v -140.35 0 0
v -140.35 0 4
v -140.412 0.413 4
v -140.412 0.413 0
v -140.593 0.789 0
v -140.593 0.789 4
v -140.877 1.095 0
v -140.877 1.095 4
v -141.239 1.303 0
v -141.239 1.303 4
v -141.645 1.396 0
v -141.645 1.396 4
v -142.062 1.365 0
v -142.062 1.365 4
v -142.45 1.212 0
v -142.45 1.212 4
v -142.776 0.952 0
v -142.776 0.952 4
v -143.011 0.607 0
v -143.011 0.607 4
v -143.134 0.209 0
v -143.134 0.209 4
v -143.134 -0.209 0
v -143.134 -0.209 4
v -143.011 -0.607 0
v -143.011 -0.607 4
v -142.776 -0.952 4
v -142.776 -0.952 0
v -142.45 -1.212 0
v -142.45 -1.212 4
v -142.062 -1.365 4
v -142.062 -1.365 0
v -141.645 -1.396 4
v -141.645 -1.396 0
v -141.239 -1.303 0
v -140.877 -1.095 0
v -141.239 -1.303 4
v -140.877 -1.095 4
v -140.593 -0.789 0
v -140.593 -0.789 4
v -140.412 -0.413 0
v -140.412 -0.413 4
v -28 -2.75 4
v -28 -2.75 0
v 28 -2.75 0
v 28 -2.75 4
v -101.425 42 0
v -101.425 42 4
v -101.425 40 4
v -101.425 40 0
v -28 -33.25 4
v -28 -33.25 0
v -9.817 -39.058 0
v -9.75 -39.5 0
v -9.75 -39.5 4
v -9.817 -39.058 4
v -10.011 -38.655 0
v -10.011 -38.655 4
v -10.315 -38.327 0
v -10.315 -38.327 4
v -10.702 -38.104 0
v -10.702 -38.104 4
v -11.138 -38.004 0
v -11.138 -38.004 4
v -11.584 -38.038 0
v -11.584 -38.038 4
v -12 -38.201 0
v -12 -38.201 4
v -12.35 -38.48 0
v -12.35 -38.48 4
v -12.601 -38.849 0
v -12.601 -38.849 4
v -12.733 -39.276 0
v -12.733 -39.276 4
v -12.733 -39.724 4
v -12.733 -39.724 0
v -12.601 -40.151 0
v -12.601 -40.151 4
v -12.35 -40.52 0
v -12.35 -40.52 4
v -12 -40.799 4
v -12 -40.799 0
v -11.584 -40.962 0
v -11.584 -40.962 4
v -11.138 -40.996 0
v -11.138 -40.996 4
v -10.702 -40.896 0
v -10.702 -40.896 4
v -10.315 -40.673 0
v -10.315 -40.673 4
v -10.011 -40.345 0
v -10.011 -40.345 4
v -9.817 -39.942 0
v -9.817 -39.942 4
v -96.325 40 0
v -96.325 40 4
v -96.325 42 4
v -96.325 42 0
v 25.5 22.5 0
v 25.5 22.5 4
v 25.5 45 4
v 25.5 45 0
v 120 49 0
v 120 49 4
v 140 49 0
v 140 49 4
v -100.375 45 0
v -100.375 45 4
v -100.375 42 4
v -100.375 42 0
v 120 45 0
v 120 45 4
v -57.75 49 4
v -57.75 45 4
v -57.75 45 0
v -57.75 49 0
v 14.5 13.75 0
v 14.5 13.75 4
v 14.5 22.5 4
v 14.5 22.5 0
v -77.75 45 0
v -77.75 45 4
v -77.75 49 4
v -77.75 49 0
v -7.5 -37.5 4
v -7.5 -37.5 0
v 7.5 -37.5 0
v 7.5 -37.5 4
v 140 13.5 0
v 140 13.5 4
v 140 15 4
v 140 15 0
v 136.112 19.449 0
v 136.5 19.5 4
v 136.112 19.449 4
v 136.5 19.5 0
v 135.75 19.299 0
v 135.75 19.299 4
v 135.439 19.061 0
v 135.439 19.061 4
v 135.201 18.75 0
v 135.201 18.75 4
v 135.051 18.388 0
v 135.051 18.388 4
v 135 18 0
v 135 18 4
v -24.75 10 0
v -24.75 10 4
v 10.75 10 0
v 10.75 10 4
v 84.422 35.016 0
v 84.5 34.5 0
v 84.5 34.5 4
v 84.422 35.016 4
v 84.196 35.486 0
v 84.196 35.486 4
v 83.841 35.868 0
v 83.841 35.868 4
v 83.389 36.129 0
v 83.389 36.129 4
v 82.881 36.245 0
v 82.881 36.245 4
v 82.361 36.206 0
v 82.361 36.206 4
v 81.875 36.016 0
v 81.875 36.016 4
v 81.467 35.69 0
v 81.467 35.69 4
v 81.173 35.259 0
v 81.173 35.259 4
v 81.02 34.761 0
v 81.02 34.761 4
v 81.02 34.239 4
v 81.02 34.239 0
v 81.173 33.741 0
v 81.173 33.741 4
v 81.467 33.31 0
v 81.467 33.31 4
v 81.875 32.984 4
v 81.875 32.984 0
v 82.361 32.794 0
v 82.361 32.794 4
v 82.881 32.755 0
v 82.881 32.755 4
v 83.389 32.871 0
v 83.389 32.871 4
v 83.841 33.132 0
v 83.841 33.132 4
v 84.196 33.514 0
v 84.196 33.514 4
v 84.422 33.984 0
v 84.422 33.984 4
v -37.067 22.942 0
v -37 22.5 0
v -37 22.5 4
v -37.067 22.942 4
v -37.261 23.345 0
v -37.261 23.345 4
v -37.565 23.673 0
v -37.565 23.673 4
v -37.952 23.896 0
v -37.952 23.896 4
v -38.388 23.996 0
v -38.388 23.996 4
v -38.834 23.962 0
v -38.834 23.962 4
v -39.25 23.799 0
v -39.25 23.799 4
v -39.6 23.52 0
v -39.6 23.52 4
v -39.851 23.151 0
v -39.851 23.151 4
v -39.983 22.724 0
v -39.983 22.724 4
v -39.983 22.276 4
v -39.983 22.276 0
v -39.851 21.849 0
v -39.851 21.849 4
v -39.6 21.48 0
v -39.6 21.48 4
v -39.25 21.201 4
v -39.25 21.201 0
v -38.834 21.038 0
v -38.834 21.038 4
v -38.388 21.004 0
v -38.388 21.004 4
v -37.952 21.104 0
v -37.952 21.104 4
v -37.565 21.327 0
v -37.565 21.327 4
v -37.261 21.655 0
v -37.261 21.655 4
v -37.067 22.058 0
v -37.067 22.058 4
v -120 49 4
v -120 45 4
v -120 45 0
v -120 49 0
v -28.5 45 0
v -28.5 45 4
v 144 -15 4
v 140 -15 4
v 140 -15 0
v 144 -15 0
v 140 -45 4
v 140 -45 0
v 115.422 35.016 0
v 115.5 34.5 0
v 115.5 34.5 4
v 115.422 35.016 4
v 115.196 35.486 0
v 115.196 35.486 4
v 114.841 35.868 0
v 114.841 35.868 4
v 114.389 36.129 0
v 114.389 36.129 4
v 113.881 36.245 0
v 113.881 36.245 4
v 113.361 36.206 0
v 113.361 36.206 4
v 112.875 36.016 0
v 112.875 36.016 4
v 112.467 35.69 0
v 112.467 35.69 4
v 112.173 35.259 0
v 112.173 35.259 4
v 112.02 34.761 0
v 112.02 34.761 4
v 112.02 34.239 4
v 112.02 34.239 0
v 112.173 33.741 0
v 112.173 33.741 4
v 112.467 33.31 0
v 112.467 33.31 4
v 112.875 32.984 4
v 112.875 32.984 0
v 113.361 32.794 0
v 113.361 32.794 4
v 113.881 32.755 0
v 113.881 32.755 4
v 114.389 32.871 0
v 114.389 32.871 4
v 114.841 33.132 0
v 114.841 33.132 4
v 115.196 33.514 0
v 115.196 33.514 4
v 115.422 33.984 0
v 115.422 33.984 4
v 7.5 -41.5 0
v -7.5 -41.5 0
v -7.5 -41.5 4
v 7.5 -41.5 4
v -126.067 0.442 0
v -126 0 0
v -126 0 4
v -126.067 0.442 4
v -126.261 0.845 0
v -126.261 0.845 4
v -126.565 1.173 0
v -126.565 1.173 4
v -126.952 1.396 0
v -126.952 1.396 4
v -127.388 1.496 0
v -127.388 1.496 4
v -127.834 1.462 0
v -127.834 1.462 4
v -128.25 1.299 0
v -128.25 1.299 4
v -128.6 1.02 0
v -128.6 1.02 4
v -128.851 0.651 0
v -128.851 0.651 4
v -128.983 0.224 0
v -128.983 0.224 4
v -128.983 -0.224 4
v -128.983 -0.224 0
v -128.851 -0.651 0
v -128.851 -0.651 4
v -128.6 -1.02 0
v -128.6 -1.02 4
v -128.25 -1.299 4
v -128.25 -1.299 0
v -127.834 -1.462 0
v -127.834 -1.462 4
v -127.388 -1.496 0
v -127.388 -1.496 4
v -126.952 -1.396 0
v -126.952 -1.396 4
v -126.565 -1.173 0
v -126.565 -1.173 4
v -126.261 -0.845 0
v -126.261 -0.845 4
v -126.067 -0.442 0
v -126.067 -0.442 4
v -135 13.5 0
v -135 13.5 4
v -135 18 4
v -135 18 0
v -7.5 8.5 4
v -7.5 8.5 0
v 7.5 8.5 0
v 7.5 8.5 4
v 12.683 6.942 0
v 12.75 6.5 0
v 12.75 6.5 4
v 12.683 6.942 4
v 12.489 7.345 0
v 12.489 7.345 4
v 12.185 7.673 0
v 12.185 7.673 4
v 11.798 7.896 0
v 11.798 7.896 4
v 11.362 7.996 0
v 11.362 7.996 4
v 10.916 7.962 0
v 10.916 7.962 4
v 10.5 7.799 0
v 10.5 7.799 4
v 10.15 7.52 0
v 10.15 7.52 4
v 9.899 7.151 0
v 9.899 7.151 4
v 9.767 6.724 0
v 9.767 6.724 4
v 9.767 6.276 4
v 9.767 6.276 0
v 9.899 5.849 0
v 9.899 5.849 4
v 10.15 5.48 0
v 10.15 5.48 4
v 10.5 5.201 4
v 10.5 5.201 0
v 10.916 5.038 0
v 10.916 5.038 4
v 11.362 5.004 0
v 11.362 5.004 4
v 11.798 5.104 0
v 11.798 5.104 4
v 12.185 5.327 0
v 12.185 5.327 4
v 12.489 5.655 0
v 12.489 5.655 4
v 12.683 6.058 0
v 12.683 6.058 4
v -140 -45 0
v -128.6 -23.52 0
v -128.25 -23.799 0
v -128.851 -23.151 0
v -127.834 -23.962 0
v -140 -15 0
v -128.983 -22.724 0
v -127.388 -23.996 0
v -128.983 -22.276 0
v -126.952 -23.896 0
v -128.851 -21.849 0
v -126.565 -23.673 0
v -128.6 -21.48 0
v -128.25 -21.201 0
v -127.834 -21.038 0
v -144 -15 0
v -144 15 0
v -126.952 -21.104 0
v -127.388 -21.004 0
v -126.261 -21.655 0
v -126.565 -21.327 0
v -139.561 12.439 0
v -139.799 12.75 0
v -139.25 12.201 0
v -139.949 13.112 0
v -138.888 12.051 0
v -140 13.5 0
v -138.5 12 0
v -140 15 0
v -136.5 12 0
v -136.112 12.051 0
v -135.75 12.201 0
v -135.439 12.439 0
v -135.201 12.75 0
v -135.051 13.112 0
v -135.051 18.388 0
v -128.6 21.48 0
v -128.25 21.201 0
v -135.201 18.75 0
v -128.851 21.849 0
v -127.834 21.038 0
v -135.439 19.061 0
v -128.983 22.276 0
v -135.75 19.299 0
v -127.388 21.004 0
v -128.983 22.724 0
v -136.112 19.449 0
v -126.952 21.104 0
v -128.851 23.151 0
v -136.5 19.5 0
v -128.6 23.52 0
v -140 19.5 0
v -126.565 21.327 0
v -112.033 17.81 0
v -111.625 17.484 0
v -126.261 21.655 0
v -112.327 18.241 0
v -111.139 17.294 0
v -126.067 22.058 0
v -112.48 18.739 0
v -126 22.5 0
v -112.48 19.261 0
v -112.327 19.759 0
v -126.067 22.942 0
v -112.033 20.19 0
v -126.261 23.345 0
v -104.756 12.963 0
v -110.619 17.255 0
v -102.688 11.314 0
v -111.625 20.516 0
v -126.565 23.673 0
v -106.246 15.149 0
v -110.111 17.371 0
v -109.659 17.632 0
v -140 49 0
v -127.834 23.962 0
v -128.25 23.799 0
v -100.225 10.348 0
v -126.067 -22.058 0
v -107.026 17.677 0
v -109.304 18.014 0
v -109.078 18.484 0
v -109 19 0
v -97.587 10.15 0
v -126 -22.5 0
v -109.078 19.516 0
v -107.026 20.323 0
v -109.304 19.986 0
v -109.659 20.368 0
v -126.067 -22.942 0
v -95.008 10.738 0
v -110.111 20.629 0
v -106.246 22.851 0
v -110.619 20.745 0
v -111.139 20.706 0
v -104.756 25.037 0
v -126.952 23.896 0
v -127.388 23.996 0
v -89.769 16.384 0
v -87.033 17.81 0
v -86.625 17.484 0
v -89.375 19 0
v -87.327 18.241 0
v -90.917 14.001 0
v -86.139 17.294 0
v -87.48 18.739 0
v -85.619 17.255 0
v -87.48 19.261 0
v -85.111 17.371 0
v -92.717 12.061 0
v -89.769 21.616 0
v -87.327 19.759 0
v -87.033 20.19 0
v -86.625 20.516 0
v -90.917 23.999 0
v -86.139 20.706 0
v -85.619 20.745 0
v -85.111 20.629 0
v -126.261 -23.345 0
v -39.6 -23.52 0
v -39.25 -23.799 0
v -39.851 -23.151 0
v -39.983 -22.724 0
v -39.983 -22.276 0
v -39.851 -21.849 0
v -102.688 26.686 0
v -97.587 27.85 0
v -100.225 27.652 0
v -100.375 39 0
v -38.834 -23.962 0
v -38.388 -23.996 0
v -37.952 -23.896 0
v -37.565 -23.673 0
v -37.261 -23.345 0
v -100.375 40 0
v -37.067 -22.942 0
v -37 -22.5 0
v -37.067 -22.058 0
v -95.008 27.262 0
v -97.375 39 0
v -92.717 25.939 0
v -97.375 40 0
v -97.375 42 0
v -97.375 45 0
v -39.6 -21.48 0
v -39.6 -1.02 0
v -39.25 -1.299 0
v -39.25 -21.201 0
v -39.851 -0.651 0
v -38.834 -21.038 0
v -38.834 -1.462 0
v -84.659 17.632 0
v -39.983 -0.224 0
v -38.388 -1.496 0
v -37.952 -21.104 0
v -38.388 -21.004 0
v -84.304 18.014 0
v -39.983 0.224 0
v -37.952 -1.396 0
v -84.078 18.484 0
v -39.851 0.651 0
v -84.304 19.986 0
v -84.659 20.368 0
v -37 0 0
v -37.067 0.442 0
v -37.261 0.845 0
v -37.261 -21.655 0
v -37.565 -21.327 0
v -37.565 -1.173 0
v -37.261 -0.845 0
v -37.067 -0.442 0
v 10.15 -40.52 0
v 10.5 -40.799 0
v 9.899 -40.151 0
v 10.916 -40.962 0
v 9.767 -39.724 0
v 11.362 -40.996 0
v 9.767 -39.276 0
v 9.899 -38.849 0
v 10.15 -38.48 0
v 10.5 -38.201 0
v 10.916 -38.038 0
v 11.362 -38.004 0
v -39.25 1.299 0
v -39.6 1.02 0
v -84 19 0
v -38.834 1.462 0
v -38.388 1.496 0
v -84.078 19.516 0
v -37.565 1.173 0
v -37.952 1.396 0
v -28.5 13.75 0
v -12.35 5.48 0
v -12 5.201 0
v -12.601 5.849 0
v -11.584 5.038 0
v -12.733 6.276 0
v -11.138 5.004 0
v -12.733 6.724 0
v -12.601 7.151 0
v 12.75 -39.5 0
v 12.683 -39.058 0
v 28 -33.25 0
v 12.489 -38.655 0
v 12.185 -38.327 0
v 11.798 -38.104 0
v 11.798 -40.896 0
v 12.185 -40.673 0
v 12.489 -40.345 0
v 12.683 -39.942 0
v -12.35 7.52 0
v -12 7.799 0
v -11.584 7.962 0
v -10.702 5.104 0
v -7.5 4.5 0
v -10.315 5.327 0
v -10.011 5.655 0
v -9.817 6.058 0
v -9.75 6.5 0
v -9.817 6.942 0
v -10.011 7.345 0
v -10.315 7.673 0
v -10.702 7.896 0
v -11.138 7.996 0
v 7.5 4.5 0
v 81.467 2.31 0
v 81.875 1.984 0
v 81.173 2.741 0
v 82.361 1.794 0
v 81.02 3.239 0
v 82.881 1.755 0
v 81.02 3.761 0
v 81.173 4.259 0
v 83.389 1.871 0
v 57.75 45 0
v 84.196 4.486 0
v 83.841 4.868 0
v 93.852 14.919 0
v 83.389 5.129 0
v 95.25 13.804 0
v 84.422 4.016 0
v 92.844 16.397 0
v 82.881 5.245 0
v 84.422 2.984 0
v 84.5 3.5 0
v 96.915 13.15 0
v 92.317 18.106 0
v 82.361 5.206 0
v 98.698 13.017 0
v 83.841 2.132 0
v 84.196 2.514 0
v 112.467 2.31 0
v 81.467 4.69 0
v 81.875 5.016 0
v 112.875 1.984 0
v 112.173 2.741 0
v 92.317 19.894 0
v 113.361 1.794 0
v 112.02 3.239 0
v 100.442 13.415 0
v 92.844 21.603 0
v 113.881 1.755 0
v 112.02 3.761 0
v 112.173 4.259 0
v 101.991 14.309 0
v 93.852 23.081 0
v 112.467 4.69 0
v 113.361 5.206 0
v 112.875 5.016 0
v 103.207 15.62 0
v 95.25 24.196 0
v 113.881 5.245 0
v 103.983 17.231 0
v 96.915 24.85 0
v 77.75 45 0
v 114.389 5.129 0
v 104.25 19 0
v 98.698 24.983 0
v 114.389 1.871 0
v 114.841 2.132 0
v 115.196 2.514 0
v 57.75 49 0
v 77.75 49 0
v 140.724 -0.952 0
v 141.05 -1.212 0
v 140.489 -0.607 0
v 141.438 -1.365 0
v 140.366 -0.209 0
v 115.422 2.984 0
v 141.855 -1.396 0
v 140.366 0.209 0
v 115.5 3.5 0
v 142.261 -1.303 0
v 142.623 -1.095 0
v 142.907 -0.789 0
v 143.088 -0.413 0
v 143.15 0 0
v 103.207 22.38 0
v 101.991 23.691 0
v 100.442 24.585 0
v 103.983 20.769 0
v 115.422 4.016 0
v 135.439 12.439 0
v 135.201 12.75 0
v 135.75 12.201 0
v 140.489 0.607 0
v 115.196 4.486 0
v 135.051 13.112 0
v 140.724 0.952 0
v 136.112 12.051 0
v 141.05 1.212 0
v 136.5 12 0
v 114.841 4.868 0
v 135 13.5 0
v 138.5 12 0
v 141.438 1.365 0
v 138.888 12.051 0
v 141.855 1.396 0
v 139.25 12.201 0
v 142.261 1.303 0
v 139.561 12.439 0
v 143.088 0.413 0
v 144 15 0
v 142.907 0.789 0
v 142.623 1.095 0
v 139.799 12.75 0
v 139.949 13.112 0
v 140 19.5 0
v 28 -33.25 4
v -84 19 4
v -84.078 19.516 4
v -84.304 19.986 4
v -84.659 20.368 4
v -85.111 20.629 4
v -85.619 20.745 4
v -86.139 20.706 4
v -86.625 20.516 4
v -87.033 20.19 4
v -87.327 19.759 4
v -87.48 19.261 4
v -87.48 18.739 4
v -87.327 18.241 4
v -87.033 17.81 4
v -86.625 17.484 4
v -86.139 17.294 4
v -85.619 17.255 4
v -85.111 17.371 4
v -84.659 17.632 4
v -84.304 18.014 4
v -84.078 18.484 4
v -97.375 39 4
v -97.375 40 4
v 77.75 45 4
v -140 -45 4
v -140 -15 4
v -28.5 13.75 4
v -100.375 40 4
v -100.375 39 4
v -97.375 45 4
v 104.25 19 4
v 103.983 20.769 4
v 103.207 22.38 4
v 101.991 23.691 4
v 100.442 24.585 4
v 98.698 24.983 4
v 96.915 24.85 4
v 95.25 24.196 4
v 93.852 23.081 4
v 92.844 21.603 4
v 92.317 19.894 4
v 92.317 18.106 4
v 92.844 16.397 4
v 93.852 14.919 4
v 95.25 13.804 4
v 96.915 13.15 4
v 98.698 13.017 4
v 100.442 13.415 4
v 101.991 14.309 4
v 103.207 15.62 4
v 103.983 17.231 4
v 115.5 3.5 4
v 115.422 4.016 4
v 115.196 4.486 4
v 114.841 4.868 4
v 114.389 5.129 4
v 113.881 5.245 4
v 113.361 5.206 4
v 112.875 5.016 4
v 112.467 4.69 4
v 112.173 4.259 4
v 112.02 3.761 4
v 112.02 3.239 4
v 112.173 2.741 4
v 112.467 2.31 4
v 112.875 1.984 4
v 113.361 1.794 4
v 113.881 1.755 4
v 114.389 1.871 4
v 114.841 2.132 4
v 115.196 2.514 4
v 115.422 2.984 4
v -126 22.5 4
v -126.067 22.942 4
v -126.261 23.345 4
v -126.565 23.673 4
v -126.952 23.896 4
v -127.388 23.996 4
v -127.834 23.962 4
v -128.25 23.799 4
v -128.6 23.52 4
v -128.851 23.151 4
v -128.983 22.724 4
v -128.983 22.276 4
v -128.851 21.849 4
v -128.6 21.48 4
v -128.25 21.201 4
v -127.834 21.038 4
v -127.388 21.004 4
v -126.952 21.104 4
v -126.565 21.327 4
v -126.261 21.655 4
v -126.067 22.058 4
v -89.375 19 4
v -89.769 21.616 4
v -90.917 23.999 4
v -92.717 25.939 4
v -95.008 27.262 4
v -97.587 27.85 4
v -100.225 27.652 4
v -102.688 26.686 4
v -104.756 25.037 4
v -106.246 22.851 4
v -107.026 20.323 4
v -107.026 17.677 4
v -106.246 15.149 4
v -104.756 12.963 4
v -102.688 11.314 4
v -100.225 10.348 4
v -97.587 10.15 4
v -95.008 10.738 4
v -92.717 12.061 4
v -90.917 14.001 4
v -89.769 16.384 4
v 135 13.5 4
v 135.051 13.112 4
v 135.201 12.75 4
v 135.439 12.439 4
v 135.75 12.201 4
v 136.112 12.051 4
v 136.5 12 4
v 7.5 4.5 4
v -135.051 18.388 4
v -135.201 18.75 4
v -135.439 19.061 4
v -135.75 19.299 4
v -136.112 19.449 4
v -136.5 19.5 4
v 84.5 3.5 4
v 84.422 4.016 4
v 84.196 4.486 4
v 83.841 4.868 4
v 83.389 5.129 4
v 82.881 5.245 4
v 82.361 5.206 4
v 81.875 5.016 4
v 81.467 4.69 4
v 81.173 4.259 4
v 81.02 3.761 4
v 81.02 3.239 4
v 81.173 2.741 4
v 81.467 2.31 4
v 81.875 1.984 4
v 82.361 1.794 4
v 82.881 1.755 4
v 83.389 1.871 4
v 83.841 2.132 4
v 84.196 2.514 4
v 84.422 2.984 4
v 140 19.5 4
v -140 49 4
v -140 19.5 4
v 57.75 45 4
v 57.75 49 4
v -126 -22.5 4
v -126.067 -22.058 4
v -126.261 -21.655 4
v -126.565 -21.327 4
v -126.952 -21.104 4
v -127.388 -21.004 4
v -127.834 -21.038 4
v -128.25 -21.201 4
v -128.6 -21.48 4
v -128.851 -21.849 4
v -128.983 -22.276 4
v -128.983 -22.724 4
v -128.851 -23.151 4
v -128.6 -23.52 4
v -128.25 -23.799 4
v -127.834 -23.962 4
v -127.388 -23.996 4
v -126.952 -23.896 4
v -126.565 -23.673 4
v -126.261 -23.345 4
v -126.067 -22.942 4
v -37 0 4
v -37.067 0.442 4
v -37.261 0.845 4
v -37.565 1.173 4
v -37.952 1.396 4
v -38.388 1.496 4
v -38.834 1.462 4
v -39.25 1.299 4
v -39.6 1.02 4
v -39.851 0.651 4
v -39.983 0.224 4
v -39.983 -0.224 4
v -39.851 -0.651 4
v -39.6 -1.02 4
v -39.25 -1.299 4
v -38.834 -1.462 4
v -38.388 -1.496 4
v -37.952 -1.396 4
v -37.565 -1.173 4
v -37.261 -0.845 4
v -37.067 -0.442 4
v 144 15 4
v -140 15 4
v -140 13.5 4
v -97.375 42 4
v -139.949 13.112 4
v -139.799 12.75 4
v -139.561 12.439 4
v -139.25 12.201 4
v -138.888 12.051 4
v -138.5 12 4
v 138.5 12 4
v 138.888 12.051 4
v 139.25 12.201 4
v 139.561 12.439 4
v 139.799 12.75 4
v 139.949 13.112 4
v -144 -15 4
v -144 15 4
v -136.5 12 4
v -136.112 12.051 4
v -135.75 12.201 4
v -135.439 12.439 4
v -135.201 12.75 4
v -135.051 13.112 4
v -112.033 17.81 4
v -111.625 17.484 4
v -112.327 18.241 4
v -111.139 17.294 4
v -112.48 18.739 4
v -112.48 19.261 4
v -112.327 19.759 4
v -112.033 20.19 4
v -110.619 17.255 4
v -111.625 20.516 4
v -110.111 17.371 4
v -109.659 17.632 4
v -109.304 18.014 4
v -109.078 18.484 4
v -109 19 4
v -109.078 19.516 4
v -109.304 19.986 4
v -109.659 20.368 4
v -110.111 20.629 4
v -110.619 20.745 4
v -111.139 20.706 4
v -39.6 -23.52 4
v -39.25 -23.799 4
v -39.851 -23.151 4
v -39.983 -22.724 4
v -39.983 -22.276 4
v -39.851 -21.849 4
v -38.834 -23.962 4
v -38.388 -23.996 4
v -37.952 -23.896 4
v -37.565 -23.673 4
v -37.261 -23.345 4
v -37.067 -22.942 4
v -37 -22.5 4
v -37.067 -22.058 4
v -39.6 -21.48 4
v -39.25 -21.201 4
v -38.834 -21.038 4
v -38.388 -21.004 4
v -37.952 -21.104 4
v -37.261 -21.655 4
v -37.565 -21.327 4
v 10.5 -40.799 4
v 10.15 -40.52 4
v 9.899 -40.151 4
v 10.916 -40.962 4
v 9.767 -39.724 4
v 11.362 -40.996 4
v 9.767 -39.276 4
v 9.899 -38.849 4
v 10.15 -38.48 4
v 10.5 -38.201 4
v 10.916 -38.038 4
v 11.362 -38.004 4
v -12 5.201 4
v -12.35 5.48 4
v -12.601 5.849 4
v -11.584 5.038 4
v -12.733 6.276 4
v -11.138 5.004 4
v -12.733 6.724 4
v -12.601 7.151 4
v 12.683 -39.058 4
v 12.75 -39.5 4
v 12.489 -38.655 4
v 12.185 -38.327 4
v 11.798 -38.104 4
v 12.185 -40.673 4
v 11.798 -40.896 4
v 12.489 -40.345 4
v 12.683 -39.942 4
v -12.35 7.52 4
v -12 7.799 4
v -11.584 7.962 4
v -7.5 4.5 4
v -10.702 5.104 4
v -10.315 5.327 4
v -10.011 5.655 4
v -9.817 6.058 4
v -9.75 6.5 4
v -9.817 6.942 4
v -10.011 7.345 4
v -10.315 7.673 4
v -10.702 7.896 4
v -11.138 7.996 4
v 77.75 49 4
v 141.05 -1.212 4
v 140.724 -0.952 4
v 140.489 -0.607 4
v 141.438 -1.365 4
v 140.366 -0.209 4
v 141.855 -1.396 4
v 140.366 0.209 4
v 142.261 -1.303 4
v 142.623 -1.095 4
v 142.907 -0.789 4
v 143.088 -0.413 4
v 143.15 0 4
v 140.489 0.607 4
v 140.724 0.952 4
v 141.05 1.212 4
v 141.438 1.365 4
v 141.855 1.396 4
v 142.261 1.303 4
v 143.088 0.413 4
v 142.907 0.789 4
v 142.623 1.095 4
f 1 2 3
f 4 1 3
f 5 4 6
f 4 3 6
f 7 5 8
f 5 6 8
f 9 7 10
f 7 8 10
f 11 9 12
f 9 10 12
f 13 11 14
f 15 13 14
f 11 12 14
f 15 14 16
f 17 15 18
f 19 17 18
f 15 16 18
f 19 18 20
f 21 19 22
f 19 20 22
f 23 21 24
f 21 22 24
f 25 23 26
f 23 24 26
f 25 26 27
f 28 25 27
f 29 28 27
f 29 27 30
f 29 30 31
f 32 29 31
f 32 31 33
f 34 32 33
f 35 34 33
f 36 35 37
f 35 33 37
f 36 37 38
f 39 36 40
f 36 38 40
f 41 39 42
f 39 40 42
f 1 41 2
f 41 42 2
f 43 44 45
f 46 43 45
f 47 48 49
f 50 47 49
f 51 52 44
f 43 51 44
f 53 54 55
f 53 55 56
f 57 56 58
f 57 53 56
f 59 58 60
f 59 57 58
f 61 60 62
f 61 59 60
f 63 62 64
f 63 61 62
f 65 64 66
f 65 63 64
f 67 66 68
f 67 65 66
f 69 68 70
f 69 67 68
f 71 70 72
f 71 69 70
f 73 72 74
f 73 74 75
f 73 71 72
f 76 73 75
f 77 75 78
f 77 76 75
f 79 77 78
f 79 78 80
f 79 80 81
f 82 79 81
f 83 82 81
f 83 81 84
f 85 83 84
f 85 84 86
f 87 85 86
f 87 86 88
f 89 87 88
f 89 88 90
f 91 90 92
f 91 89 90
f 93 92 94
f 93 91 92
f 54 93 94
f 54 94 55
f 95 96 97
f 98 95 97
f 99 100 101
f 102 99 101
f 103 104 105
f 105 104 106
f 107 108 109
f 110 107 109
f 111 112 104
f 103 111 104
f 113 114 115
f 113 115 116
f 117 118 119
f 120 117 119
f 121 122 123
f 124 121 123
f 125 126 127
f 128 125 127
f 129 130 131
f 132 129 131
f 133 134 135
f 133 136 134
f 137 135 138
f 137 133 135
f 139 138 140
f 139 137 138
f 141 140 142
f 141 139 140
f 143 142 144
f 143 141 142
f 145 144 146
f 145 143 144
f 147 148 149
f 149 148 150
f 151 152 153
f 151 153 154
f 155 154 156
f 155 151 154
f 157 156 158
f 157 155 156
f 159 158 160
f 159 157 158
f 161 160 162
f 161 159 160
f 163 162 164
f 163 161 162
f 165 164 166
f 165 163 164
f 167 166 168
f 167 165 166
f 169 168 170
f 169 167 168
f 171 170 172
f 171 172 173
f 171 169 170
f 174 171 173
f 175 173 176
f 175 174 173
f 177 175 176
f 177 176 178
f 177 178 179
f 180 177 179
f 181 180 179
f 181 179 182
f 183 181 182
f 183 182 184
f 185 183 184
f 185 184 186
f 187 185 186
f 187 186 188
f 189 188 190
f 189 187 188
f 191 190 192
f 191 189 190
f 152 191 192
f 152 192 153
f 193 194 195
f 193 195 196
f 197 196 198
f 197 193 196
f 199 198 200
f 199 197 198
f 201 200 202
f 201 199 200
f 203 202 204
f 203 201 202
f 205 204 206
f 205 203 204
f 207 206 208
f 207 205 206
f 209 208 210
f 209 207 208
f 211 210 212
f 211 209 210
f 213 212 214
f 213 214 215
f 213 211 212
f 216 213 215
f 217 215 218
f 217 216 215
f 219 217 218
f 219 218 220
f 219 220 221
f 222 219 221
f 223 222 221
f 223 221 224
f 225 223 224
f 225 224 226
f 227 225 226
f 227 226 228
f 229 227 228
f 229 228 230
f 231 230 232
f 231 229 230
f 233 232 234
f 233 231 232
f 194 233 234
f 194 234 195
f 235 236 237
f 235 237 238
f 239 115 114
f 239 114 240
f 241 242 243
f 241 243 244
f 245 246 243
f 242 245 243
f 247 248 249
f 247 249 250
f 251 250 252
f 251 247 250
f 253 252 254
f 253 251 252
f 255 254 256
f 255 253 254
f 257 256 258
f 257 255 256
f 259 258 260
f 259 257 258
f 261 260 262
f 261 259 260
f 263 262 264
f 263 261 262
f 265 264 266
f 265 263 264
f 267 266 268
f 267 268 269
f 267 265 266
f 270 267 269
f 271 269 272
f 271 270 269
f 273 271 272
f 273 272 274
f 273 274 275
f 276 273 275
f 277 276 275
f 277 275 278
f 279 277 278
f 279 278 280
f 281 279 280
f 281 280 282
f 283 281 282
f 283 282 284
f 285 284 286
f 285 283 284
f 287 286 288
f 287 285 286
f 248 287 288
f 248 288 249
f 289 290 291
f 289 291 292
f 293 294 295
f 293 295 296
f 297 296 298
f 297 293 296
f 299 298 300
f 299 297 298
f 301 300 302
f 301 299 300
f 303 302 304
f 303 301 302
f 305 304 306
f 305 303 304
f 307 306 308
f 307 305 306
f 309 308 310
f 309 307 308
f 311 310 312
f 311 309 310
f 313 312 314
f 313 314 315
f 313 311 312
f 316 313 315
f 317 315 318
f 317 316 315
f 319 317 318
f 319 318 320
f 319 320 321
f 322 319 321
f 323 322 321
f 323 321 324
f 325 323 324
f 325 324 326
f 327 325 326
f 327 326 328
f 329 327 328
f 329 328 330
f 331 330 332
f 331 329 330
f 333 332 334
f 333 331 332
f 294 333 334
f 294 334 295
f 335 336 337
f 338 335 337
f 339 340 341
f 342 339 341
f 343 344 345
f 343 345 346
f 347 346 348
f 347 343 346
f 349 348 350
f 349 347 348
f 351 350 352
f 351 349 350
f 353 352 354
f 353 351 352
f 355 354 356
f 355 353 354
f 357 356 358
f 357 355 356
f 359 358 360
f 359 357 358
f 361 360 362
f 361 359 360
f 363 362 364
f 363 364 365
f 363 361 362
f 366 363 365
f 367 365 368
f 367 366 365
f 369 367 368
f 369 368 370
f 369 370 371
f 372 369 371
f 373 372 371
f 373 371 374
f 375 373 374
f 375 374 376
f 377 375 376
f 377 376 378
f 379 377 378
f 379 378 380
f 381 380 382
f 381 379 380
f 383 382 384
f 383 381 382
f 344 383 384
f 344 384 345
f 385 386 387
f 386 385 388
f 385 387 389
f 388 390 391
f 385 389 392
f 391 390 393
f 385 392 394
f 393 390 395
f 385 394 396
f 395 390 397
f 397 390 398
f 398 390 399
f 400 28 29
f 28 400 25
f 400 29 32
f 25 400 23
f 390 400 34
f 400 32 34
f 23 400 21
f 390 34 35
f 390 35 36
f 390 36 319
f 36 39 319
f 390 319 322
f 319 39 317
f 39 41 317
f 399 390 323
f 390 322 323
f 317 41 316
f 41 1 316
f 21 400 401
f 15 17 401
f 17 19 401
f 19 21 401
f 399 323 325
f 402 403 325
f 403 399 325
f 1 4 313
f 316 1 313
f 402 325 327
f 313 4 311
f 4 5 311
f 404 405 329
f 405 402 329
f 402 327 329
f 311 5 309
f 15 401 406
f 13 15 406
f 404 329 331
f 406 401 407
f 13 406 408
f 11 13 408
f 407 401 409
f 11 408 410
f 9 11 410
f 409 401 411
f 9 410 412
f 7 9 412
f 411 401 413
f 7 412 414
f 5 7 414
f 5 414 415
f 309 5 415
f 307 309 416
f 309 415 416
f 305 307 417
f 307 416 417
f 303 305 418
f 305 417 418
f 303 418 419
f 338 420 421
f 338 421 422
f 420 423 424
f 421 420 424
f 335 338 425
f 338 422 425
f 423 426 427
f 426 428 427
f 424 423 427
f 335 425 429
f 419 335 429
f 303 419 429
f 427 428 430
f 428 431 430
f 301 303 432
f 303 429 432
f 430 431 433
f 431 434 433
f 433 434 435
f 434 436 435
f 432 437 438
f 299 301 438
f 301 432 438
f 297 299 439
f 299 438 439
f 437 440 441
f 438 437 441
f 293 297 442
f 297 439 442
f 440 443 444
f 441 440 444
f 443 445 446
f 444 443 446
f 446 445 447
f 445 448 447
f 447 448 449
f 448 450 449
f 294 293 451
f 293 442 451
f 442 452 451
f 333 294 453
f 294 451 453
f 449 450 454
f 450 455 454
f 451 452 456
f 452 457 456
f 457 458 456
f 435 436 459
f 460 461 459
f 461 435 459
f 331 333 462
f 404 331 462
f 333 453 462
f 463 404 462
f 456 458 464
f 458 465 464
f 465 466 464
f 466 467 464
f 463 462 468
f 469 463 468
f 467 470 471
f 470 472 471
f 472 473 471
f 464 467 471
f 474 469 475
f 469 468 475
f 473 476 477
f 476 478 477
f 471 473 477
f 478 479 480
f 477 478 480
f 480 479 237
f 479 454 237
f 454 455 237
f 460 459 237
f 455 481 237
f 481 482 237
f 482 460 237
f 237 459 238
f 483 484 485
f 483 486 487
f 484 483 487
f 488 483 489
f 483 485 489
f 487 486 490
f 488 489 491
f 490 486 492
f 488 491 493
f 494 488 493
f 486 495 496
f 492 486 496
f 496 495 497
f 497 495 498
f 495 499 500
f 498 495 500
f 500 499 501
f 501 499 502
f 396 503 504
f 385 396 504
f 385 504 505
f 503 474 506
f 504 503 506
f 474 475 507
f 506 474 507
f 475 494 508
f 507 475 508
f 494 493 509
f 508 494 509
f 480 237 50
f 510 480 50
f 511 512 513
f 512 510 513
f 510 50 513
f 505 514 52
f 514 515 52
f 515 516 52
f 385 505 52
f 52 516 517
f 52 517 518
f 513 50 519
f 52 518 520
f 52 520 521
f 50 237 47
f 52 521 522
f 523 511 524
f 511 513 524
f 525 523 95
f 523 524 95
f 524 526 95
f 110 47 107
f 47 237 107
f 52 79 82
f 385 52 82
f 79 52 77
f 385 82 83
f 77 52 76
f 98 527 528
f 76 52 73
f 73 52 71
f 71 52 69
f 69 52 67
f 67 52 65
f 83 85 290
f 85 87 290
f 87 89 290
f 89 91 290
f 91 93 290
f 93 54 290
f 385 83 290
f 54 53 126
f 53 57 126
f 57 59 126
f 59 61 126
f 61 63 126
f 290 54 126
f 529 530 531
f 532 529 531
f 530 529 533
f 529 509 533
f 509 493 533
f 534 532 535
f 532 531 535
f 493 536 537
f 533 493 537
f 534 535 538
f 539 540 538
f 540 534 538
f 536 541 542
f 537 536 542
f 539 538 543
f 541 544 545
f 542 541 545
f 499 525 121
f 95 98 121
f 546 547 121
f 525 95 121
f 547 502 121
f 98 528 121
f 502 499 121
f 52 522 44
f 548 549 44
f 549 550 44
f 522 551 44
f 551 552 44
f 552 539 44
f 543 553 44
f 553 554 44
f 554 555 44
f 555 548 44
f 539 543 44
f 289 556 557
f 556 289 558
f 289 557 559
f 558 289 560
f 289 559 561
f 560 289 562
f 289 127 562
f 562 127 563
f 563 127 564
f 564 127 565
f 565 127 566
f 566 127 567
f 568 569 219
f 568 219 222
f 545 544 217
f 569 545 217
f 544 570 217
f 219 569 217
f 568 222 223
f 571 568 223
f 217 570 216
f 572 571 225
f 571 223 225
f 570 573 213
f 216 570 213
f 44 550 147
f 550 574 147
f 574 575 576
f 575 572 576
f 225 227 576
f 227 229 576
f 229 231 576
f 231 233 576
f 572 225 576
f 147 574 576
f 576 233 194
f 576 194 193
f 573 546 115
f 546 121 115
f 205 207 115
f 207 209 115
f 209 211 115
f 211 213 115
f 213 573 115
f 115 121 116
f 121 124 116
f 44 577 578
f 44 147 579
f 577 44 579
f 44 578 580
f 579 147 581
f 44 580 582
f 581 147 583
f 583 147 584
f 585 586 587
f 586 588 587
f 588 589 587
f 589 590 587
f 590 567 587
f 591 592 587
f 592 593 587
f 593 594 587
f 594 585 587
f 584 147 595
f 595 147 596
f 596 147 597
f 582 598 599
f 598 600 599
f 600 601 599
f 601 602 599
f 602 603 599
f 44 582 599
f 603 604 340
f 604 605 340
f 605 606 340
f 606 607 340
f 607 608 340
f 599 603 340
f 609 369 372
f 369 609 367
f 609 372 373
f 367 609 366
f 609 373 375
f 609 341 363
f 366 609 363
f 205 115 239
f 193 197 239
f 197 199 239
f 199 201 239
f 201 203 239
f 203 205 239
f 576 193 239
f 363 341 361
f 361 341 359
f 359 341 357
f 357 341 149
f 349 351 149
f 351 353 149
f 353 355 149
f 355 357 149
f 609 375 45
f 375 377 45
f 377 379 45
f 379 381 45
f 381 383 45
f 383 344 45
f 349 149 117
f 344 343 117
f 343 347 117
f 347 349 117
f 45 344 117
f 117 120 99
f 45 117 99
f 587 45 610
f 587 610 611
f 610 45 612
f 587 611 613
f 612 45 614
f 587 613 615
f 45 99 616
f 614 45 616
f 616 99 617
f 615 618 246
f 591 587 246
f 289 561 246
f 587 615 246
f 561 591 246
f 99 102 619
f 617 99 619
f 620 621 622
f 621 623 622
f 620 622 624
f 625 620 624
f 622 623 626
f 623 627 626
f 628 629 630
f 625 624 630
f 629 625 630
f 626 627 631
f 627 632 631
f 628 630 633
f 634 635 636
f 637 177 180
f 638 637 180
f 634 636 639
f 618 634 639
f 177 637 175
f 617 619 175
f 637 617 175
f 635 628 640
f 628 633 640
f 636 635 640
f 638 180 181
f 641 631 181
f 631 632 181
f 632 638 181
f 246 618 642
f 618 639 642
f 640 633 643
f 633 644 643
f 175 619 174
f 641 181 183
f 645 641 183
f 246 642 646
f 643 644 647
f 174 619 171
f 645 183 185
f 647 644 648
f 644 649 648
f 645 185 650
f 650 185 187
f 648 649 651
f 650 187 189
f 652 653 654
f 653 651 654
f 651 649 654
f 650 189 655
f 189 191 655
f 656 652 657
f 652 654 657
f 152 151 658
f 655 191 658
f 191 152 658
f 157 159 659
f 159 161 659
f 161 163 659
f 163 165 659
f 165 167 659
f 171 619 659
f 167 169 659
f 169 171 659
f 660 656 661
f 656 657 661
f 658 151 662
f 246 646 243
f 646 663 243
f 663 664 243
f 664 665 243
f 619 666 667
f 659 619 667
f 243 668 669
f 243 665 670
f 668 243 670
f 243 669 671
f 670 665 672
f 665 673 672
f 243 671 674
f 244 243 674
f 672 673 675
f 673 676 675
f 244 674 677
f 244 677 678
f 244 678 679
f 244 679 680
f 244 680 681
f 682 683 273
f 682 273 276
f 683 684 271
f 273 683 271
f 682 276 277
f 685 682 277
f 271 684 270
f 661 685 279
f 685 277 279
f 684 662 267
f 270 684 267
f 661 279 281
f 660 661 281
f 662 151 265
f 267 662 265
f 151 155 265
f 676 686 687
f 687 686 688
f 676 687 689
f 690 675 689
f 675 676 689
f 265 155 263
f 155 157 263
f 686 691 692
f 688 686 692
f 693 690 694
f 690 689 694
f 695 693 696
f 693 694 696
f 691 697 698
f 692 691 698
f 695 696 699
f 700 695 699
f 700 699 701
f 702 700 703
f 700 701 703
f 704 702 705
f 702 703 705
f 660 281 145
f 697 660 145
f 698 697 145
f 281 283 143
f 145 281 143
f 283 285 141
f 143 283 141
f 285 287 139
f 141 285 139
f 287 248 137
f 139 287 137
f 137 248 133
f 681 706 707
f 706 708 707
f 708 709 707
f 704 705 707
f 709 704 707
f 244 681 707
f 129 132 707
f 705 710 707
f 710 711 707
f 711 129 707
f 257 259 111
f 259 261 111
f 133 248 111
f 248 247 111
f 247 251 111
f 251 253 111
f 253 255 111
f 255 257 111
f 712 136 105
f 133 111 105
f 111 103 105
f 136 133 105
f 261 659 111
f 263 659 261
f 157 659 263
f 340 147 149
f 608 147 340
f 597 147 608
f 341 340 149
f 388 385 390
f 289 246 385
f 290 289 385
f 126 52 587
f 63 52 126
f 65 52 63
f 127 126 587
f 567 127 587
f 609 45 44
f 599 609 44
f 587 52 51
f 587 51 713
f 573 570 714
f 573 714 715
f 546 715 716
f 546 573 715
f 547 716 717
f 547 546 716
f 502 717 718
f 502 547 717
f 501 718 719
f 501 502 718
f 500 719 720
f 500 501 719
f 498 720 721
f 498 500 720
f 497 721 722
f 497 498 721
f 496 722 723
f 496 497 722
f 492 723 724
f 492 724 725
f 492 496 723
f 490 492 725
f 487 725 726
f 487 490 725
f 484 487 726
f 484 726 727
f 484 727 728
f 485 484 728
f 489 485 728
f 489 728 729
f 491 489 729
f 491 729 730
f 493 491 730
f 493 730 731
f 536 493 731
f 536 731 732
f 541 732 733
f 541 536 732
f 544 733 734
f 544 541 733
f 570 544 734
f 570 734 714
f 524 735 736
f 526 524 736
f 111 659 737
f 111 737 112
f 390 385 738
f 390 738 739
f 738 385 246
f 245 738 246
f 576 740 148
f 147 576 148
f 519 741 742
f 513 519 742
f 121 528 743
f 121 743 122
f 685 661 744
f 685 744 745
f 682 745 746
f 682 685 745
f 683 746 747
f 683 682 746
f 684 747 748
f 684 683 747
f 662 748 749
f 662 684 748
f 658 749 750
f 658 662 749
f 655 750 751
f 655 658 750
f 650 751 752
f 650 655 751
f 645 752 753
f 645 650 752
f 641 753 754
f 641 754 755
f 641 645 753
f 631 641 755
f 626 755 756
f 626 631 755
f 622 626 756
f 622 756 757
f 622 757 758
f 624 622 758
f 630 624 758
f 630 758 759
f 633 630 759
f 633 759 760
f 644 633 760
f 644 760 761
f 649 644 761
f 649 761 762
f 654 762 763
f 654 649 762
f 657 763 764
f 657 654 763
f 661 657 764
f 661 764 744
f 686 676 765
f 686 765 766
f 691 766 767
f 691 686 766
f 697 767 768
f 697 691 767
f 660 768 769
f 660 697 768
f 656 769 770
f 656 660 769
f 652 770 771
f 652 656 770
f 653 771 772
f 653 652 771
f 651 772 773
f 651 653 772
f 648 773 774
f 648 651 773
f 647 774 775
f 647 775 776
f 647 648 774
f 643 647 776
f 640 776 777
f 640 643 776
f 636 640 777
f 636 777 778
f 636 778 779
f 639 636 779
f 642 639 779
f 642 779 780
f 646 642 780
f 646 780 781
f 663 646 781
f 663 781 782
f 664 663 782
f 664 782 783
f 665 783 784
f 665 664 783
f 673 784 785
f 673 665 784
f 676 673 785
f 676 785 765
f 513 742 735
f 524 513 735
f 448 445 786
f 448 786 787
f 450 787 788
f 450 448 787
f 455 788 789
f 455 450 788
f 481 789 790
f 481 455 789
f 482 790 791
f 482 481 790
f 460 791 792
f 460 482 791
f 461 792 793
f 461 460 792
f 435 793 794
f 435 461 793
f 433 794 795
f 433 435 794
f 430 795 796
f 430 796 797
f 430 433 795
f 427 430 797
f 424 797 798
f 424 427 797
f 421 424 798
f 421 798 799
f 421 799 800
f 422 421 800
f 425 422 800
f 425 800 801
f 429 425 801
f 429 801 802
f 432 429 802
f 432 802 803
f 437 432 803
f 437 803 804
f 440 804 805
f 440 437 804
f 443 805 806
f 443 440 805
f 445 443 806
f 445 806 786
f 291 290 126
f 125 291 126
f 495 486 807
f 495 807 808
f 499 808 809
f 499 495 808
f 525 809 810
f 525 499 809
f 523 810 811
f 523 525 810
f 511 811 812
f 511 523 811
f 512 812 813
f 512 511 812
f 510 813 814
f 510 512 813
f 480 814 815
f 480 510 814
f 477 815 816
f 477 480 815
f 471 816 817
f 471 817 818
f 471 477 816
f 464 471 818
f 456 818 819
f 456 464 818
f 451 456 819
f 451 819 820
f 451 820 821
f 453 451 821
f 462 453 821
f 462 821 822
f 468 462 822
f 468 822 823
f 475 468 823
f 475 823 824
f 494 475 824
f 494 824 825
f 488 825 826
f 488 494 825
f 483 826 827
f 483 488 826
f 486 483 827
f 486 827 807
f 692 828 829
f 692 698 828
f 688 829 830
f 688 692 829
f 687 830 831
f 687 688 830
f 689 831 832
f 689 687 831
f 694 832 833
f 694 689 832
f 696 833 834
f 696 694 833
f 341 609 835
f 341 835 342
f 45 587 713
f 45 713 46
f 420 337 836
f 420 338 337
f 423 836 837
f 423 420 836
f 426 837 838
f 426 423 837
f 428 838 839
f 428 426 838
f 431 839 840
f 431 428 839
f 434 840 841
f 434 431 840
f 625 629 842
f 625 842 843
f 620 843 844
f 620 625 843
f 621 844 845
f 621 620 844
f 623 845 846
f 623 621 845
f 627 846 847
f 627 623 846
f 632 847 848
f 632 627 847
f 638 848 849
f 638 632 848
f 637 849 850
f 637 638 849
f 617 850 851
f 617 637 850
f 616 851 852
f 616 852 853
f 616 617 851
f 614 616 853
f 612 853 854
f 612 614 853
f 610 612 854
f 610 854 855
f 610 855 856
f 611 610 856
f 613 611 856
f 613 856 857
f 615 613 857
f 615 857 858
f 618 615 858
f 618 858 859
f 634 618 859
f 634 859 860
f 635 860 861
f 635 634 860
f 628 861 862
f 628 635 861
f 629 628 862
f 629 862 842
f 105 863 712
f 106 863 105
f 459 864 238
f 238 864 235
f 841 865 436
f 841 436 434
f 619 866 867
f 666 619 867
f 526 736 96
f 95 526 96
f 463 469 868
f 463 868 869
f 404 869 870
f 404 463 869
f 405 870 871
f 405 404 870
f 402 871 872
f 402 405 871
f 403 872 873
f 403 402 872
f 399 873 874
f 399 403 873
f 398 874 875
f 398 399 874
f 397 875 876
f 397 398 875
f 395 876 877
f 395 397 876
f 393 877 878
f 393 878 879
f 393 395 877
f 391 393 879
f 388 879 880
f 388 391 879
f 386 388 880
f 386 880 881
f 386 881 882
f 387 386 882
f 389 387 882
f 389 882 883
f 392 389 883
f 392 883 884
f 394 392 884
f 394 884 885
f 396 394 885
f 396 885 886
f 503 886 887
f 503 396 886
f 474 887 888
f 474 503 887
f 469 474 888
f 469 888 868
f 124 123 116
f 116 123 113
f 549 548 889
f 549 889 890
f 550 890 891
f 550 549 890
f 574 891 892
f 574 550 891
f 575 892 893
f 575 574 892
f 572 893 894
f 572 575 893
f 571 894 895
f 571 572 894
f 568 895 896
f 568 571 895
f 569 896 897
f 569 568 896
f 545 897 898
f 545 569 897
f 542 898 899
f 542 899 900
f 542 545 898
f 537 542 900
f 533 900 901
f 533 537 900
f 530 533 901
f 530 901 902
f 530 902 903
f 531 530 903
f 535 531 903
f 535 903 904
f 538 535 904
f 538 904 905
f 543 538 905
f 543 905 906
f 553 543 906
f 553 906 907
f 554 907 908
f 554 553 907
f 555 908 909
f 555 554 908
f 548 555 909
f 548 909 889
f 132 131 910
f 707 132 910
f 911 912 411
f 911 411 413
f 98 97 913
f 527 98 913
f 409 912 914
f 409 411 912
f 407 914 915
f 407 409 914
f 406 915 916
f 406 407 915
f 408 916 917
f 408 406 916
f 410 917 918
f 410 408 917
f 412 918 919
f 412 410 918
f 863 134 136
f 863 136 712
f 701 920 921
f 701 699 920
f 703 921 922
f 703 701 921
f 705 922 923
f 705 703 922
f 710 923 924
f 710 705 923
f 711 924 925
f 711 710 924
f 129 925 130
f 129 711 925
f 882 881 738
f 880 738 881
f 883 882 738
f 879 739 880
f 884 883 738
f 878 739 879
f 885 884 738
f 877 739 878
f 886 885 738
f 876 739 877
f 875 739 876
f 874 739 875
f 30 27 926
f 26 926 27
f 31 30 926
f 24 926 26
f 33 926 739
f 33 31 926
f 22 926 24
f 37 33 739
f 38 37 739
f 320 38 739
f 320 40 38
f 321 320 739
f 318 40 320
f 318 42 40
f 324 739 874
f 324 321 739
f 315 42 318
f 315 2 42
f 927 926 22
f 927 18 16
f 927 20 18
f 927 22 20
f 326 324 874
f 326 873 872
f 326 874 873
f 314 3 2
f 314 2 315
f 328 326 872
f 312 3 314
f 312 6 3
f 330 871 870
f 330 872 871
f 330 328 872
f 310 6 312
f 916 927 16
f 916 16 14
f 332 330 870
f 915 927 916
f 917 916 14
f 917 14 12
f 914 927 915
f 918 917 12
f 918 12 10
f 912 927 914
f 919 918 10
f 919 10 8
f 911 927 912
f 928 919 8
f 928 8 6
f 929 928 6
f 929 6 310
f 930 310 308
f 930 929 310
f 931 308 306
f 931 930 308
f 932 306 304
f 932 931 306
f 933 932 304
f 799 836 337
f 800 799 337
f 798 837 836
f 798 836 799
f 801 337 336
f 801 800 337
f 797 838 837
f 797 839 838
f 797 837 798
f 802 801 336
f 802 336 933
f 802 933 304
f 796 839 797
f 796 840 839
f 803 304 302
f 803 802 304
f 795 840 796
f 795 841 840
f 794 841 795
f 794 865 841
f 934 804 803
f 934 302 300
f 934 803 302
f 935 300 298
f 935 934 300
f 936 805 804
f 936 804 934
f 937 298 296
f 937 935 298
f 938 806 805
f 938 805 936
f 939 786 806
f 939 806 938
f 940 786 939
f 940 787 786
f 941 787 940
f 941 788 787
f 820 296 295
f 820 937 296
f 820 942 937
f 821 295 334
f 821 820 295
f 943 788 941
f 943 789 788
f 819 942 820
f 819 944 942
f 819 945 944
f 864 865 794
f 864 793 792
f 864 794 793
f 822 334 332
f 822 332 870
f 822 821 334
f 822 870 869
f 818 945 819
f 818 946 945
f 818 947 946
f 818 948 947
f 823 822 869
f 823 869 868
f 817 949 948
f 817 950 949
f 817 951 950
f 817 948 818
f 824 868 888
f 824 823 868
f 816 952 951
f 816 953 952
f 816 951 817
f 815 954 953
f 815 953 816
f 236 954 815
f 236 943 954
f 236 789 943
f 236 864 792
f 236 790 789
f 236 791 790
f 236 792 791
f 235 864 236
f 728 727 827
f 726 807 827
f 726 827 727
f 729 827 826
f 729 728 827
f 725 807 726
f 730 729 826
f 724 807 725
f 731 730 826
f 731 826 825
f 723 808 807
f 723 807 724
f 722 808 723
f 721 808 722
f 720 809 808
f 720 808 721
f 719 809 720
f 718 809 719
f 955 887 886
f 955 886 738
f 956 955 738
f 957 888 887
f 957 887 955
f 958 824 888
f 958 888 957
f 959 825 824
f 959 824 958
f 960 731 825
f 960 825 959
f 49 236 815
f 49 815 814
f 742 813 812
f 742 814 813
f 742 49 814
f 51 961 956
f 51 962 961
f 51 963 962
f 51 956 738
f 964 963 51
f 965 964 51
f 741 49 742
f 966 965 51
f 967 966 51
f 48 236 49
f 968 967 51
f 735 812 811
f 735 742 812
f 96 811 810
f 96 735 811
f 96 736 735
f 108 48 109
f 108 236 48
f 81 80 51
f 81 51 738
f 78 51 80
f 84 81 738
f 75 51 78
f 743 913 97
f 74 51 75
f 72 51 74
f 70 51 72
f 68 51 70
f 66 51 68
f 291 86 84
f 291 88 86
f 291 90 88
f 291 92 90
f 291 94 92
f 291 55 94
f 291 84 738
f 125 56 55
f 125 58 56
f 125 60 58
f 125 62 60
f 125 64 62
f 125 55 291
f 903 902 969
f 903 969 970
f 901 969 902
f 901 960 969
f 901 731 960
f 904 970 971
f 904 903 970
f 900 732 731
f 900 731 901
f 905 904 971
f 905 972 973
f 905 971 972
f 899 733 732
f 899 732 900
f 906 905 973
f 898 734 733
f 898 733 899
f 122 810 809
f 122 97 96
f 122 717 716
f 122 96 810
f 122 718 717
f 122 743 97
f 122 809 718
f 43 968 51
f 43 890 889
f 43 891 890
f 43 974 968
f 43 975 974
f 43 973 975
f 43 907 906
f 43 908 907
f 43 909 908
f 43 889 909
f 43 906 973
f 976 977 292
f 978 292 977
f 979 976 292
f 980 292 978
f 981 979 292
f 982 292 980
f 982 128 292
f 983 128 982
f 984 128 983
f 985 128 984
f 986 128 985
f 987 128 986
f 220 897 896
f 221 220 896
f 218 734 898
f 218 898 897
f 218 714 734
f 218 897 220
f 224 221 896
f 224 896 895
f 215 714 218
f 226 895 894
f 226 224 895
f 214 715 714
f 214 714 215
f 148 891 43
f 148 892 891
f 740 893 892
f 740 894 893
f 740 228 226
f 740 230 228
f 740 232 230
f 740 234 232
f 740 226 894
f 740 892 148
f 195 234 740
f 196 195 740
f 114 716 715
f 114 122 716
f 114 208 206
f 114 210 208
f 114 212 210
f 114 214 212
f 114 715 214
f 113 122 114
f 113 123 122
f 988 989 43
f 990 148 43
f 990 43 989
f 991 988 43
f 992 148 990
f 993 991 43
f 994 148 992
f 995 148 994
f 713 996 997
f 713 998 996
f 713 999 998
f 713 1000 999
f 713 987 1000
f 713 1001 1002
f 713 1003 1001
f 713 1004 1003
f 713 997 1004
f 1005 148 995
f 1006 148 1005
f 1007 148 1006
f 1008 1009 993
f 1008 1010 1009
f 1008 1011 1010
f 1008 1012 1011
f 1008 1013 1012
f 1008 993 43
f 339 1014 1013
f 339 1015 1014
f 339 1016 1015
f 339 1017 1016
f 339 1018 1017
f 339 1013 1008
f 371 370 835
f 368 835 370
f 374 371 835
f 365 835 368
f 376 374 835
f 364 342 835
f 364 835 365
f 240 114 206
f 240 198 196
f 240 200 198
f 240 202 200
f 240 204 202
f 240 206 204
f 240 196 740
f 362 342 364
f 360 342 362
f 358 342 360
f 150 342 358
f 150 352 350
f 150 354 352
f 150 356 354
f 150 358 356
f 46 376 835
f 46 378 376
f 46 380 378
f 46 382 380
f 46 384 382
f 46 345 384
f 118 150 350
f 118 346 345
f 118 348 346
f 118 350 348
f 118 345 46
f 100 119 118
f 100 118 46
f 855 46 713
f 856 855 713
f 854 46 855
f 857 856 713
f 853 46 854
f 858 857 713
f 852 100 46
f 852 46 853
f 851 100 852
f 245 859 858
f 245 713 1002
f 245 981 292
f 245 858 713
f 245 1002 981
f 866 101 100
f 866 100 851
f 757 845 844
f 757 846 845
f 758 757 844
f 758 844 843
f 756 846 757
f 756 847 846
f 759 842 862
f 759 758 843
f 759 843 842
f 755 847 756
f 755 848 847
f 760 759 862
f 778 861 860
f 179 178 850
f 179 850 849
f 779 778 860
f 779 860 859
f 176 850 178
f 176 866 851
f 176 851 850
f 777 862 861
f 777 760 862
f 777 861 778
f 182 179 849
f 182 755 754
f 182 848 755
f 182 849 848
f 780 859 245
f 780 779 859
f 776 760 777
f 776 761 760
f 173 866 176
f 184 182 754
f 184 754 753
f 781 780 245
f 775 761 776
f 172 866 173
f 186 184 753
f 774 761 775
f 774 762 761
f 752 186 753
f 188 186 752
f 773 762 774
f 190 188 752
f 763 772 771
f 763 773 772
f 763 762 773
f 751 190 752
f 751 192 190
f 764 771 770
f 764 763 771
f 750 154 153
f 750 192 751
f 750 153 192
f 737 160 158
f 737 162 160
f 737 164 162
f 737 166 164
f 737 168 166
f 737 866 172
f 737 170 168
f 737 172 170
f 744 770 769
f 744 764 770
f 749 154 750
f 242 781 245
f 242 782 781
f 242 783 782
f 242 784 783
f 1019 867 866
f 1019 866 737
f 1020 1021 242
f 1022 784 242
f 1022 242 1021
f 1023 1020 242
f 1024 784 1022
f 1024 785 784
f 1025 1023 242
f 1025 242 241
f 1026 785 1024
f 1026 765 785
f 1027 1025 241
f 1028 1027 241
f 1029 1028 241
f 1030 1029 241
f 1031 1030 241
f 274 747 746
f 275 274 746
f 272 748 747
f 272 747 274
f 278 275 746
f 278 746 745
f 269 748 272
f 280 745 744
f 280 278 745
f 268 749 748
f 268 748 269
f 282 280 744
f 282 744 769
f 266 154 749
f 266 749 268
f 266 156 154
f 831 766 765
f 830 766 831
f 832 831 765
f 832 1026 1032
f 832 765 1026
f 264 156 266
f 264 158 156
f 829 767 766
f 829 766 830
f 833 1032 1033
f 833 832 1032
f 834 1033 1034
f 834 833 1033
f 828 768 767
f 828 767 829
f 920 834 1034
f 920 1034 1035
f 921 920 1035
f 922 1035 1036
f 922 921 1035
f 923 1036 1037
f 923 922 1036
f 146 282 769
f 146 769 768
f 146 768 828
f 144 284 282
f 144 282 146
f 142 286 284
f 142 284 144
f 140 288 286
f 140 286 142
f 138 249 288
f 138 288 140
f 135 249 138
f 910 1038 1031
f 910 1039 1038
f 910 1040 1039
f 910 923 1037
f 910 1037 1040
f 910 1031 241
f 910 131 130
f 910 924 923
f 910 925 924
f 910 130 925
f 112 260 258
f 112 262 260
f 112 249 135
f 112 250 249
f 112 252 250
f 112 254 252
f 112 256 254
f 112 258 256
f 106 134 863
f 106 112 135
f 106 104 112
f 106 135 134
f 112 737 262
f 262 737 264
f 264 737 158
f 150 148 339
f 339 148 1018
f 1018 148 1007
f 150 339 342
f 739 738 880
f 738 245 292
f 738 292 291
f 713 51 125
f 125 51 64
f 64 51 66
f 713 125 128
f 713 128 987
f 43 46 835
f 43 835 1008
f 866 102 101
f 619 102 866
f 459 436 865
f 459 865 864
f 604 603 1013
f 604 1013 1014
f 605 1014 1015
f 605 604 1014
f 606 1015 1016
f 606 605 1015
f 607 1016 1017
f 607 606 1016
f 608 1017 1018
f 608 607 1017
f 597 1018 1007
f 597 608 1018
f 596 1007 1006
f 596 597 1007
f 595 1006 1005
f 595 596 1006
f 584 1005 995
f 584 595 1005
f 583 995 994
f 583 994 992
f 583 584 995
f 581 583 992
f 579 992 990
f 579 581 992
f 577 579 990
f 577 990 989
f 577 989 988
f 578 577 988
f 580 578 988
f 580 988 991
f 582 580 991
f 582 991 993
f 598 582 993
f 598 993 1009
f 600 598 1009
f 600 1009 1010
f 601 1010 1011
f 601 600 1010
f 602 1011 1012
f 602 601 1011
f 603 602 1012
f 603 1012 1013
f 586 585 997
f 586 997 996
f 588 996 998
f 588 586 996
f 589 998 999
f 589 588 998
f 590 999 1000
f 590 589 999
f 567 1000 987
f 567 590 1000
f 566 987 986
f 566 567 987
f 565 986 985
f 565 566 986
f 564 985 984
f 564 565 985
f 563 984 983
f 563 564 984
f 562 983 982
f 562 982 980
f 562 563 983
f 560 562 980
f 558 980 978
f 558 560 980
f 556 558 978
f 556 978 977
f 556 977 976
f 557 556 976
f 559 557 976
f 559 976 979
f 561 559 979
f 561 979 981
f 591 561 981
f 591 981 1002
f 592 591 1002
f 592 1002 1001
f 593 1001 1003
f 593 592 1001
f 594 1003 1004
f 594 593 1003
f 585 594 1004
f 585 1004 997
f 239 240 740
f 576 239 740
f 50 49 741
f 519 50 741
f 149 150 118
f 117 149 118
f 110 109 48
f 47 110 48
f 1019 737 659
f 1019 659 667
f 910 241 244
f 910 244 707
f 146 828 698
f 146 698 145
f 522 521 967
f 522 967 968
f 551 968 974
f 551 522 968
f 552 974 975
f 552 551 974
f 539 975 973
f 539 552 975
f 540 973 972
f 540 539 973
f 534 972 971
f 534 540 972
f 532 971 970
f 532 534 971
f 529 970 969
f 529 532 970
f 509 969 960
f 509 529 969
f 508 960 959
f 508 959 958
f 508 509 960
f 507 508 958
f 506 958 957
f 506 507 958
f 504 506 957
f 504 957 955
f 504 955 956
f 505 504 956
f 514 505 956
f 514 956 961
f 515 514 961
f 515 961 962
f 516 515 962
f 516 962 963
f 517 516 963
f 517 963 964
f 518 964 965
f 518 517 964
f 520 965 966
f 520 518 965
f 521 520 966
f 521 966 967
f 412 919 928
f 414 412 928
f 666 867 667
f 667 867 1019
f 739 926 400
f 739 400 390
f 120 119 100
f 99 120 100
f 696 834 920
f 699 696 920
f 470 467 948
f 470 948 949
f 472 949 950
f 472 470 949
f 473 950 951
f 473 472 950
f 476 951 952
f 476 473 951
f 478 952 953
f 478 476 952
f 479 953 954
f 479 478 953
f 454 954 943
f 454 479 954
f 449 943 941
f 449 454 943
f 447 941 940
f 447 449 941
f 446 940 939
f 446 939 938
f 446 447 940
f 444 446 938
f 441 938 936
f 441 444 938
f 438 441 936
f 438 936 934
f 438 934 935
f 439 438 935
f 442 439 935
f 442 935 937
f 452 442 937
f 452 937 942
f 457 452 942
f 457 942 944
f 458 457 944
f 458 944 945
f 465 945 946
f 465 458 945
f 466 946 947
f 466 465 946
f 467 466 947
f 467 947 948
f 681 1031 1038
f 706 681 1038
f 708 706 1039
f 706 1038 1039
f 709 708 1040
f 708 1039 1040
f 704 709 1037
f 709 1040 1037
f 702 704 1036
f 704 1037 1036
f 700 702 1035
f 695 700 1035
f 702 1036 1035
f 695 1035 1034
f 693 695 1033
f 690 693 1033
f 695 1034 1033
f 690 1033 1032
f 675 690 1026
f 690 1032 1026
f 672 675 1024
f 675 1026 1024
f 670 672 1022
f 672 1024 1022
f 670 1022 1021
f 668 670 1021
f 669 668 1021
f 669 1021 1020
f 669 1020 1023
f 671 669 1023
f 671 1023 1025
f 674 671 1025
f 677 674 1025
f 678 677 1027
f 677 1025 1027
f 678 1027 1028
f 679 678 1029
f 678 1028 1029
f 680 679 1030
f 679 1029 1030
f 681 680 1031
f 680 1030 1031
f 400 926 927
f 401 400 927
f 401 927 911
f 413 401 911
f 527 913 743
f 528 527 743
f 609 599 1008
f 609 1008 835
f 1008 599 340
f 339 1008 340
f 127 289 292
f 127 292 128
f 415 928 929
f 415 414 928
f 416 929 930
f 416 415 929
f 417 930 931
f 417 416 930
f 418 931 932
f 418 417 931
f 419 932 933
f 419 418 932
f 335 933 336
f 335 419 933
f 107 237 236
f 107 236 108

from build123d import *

# Parameters (mm, degrees)
SKETCH_1_W          = 280
SKETCH_1_H          = 90
SKETCH_1_R          = 1.5
SKETCH_1_R_2        = 1.75
SKETCH_1_R_3        = 6
SKETCH_1_R_4        = 8.875
SKETCH_1_W_2        = 15
SKETCH_1_H_2        = 4
SKETCH_1_W_3        = 56
SKETCH_1_H_3        = 30.5
EXTRUDE_1_DEPTH     = 4
SKETCH_2_W          = 20
SKETCH_2_H          = 4
SKETCH_2_W_2        = 4
SKETCH_2_H_2        = 30
SKETCH_2_R          = 1.4
EXTRUDE_2_DEPTH     = 4
SKETCH_3_W          = 5
SKETCH_3_H          = 7.5
CUT_EXTRUDE_1_DEPTH = 153.161098839
FILLET_1_R          = 1.5


with BuildPart() as part:
    # Эскиз1 → Бобышка-Вытянуть1 (new body)
    with BuildSketch(Plane.XY):
        Rectangle(SKETCH_1_W, SKETCH_1_H)
        with Locations((11.25, 6.5)):
            Circle(SKETCH_1_R, mode=Mode.SUBTRACT)
        with Locations((-11.25, 6.5)):
            Circle(SKETCH_1_R, mode=Mode.SUBTRACT)
        with Locations((-11.25, -39.5)):
            Circle(SKETCH_1_R, mode=Mode.SUBTRACT)
        with Locations((11.25, -39.5)):
            Circle(SKETCH_1_R, mode=Mode.SUBTRACT)
        with Locations((113.75, 34.5)):
            Circle(SKETCH_1_R_2, mode=Mode.SUBTRACT)
        with Locations((98.25, 19)):
            Circle(SKETCH_1_R_3, mode=Mode.SUBTRACT)
        with Locations((-98.25, 19)):
            Circle(SKETCH_1_R_4, mode=Mode.SUBTRACT)
        with Locations((113.75, 3.5)):
            Circle(SKETCH_1_R_2, mode=Mode.SUBTRACT)
        with Locations((82.75, 3.5)):
            Circle(SKETCH_1_R_2, mode=Mode.SUBTRACT)
        with Locations((82.75, 34.5)):
            Circle(SKETCH_1_R_2, mode=Mode.SUBTRACT)
        with Locations((-110.75, 19)):
            Circle(SKETCH_1_R_2, mode=Mode.SUBTRACT)
        with Locations((-85.75, 19)):
            Circle(SKETCH_1_R_2, mode=Mode.SUBTRACT)
        with Locations((-127.5, 22.5)):
            Circle(SKETCH_1_R, mode=Mode.SUBTRACT)
        with Locations((-127.5, 0)):
            Circle(SKETCH_1_R, mode=Mode.SUBTRACT)
        with Locations((-127.5, -22.5)):
            Circle(SKETCH_1_R, mode=Mode.SUBTRACT)
        with Locations((-38.5, 22.5)):
            Circle(SKETCH_1_R, mode=Mode.SUBTRACT)
        with Locations((-38.5, 0)):
            Circle(SKETCH_1_R, mode=Mode.SUBTRACT)
        with Locations((-38.5, -22.5)):
            Circle(SKETCH_1_R, mode=Mode.SUBTRACT)
        with Locations((0, -39.5)):
            Rectangle(SKETCH_1_W_2, SKETCH_1_H_2, mode=Mode.SUBTRACT)
        with Locations((0, 6.5)):
            Rectangle(SKETCH_1_W_2, SKETCH_1_H_2, mode=Mode.SUBTRACT)
        with Locations((0, -18)):
            Rectangle(SKETCH_1_W_3, SKETCH_1_H_3, mode=Mode.SUBTRACT)
    extrude(amount=EXTRUDE_1_DEPTH)

    # Эскиз2 → Бобышка-Вытянуть2 (add, through all)
    # profile 1 of 6: a face of its own
    with BuildSketch(Plane.XY.offset(4)):
        with Locations((130, 47)):
            Rectangle(SKETCH_2_W, SKETCH_2_H)
    # profile 2 of 6: a face of its own
    with BuildSketch(Plane.XY.offset(4)):
        with Locations((142, 0)):
            Rectangle(SKETCH_2_W_2, SKETCH_2_H_2)
        with Locations((141.75, 0)):
            Circle(SKETCH_2_R, mode=Mode.SUBTRACT)
    # profile 3 of 6: a face of its own
    with BuildSketch(Plane.XY.offset(4)):
        with Locations((-130, 47)):
            Rectangle(SKETCH_2_W, SKETCH_2_H)
    # profile 4 of 6: a face of its own
    with BuildSketch(Plane.XY.offset(4)):
        with Locations((-142, 0)):
            Rectangle(SKETCH_2_W_2, SKETCH_2_H_2)
        with Locations((-141.75, 0)):
            Circle(SKETCH_2_R, mode=Mode.SUBTRACT)
    # profile 5 of 6: a face of its own
    with BuildSketch(Plane.XY.offset(4)):
        with Locations((67.75, 47)):
            Rectangle(SKETCH_2_W, SKETCH_2_H)
    # profile 6 of 6: a face of its own
    with BuildSketch(Plane.XY.offset(4)):
        with Locations((-67.75, 47)):
            Rectangle(SKETCH_2_W, SKETCH_2_H)
    extrude(amount=-EXTRUDE_2_DEPTH)

    # Эскиз3 → Вырез-Вытянуть1 (cut, through all)
    with BuildSketch(Plane.XY.offset(4)):
        Polygon((14.5, 45), (14.5, 49), (-20.75, 49), (-20.75, 45), (-28.5, 45), (-28.5, 13.75), (-24.75, 10), (10.75, 10), (14.5, 13.75), (14.5, 22.5), (25.5, 22.5), (25.5, 45), align=None)
        Polygon((-97.375, 42), (-97.375, 45), (-100.375, 45), (-100.375, 42), (-101.425, 42), (-101.425, 40), (-100.375, 40), (-100.375, 39), (-97.375, 39), (-97.375, 40), (-96.325, 40), (-96.325, 42), align=None)
        with Locations((137.5, 15.75)):
            Rectangle(SKETCH_3_W, SKETCH_3_H)
        with Locations((-137.5, 15.75)):
            Rectangle(SKETCH_3_W, SKETCH_3_H)
    extrude(amount=-CUT_EXTRUDE_1_DEPTH, mode=Mode.SUBTRACT)

    # Скругление1
    fillet_1_edges = [part.edges().sort_by_distance(p)[0] for p in [
        (140, 12, 2),
        (135, 12, 2),
        (135, 19.5, 2),
        (-135, 12, 2),
        (-140, 12, 2),
        (-135, 19.5, 2),
    ]]
    fillet(fillet_1_edges, radius=FILLET_1_R)


solid = part.part
